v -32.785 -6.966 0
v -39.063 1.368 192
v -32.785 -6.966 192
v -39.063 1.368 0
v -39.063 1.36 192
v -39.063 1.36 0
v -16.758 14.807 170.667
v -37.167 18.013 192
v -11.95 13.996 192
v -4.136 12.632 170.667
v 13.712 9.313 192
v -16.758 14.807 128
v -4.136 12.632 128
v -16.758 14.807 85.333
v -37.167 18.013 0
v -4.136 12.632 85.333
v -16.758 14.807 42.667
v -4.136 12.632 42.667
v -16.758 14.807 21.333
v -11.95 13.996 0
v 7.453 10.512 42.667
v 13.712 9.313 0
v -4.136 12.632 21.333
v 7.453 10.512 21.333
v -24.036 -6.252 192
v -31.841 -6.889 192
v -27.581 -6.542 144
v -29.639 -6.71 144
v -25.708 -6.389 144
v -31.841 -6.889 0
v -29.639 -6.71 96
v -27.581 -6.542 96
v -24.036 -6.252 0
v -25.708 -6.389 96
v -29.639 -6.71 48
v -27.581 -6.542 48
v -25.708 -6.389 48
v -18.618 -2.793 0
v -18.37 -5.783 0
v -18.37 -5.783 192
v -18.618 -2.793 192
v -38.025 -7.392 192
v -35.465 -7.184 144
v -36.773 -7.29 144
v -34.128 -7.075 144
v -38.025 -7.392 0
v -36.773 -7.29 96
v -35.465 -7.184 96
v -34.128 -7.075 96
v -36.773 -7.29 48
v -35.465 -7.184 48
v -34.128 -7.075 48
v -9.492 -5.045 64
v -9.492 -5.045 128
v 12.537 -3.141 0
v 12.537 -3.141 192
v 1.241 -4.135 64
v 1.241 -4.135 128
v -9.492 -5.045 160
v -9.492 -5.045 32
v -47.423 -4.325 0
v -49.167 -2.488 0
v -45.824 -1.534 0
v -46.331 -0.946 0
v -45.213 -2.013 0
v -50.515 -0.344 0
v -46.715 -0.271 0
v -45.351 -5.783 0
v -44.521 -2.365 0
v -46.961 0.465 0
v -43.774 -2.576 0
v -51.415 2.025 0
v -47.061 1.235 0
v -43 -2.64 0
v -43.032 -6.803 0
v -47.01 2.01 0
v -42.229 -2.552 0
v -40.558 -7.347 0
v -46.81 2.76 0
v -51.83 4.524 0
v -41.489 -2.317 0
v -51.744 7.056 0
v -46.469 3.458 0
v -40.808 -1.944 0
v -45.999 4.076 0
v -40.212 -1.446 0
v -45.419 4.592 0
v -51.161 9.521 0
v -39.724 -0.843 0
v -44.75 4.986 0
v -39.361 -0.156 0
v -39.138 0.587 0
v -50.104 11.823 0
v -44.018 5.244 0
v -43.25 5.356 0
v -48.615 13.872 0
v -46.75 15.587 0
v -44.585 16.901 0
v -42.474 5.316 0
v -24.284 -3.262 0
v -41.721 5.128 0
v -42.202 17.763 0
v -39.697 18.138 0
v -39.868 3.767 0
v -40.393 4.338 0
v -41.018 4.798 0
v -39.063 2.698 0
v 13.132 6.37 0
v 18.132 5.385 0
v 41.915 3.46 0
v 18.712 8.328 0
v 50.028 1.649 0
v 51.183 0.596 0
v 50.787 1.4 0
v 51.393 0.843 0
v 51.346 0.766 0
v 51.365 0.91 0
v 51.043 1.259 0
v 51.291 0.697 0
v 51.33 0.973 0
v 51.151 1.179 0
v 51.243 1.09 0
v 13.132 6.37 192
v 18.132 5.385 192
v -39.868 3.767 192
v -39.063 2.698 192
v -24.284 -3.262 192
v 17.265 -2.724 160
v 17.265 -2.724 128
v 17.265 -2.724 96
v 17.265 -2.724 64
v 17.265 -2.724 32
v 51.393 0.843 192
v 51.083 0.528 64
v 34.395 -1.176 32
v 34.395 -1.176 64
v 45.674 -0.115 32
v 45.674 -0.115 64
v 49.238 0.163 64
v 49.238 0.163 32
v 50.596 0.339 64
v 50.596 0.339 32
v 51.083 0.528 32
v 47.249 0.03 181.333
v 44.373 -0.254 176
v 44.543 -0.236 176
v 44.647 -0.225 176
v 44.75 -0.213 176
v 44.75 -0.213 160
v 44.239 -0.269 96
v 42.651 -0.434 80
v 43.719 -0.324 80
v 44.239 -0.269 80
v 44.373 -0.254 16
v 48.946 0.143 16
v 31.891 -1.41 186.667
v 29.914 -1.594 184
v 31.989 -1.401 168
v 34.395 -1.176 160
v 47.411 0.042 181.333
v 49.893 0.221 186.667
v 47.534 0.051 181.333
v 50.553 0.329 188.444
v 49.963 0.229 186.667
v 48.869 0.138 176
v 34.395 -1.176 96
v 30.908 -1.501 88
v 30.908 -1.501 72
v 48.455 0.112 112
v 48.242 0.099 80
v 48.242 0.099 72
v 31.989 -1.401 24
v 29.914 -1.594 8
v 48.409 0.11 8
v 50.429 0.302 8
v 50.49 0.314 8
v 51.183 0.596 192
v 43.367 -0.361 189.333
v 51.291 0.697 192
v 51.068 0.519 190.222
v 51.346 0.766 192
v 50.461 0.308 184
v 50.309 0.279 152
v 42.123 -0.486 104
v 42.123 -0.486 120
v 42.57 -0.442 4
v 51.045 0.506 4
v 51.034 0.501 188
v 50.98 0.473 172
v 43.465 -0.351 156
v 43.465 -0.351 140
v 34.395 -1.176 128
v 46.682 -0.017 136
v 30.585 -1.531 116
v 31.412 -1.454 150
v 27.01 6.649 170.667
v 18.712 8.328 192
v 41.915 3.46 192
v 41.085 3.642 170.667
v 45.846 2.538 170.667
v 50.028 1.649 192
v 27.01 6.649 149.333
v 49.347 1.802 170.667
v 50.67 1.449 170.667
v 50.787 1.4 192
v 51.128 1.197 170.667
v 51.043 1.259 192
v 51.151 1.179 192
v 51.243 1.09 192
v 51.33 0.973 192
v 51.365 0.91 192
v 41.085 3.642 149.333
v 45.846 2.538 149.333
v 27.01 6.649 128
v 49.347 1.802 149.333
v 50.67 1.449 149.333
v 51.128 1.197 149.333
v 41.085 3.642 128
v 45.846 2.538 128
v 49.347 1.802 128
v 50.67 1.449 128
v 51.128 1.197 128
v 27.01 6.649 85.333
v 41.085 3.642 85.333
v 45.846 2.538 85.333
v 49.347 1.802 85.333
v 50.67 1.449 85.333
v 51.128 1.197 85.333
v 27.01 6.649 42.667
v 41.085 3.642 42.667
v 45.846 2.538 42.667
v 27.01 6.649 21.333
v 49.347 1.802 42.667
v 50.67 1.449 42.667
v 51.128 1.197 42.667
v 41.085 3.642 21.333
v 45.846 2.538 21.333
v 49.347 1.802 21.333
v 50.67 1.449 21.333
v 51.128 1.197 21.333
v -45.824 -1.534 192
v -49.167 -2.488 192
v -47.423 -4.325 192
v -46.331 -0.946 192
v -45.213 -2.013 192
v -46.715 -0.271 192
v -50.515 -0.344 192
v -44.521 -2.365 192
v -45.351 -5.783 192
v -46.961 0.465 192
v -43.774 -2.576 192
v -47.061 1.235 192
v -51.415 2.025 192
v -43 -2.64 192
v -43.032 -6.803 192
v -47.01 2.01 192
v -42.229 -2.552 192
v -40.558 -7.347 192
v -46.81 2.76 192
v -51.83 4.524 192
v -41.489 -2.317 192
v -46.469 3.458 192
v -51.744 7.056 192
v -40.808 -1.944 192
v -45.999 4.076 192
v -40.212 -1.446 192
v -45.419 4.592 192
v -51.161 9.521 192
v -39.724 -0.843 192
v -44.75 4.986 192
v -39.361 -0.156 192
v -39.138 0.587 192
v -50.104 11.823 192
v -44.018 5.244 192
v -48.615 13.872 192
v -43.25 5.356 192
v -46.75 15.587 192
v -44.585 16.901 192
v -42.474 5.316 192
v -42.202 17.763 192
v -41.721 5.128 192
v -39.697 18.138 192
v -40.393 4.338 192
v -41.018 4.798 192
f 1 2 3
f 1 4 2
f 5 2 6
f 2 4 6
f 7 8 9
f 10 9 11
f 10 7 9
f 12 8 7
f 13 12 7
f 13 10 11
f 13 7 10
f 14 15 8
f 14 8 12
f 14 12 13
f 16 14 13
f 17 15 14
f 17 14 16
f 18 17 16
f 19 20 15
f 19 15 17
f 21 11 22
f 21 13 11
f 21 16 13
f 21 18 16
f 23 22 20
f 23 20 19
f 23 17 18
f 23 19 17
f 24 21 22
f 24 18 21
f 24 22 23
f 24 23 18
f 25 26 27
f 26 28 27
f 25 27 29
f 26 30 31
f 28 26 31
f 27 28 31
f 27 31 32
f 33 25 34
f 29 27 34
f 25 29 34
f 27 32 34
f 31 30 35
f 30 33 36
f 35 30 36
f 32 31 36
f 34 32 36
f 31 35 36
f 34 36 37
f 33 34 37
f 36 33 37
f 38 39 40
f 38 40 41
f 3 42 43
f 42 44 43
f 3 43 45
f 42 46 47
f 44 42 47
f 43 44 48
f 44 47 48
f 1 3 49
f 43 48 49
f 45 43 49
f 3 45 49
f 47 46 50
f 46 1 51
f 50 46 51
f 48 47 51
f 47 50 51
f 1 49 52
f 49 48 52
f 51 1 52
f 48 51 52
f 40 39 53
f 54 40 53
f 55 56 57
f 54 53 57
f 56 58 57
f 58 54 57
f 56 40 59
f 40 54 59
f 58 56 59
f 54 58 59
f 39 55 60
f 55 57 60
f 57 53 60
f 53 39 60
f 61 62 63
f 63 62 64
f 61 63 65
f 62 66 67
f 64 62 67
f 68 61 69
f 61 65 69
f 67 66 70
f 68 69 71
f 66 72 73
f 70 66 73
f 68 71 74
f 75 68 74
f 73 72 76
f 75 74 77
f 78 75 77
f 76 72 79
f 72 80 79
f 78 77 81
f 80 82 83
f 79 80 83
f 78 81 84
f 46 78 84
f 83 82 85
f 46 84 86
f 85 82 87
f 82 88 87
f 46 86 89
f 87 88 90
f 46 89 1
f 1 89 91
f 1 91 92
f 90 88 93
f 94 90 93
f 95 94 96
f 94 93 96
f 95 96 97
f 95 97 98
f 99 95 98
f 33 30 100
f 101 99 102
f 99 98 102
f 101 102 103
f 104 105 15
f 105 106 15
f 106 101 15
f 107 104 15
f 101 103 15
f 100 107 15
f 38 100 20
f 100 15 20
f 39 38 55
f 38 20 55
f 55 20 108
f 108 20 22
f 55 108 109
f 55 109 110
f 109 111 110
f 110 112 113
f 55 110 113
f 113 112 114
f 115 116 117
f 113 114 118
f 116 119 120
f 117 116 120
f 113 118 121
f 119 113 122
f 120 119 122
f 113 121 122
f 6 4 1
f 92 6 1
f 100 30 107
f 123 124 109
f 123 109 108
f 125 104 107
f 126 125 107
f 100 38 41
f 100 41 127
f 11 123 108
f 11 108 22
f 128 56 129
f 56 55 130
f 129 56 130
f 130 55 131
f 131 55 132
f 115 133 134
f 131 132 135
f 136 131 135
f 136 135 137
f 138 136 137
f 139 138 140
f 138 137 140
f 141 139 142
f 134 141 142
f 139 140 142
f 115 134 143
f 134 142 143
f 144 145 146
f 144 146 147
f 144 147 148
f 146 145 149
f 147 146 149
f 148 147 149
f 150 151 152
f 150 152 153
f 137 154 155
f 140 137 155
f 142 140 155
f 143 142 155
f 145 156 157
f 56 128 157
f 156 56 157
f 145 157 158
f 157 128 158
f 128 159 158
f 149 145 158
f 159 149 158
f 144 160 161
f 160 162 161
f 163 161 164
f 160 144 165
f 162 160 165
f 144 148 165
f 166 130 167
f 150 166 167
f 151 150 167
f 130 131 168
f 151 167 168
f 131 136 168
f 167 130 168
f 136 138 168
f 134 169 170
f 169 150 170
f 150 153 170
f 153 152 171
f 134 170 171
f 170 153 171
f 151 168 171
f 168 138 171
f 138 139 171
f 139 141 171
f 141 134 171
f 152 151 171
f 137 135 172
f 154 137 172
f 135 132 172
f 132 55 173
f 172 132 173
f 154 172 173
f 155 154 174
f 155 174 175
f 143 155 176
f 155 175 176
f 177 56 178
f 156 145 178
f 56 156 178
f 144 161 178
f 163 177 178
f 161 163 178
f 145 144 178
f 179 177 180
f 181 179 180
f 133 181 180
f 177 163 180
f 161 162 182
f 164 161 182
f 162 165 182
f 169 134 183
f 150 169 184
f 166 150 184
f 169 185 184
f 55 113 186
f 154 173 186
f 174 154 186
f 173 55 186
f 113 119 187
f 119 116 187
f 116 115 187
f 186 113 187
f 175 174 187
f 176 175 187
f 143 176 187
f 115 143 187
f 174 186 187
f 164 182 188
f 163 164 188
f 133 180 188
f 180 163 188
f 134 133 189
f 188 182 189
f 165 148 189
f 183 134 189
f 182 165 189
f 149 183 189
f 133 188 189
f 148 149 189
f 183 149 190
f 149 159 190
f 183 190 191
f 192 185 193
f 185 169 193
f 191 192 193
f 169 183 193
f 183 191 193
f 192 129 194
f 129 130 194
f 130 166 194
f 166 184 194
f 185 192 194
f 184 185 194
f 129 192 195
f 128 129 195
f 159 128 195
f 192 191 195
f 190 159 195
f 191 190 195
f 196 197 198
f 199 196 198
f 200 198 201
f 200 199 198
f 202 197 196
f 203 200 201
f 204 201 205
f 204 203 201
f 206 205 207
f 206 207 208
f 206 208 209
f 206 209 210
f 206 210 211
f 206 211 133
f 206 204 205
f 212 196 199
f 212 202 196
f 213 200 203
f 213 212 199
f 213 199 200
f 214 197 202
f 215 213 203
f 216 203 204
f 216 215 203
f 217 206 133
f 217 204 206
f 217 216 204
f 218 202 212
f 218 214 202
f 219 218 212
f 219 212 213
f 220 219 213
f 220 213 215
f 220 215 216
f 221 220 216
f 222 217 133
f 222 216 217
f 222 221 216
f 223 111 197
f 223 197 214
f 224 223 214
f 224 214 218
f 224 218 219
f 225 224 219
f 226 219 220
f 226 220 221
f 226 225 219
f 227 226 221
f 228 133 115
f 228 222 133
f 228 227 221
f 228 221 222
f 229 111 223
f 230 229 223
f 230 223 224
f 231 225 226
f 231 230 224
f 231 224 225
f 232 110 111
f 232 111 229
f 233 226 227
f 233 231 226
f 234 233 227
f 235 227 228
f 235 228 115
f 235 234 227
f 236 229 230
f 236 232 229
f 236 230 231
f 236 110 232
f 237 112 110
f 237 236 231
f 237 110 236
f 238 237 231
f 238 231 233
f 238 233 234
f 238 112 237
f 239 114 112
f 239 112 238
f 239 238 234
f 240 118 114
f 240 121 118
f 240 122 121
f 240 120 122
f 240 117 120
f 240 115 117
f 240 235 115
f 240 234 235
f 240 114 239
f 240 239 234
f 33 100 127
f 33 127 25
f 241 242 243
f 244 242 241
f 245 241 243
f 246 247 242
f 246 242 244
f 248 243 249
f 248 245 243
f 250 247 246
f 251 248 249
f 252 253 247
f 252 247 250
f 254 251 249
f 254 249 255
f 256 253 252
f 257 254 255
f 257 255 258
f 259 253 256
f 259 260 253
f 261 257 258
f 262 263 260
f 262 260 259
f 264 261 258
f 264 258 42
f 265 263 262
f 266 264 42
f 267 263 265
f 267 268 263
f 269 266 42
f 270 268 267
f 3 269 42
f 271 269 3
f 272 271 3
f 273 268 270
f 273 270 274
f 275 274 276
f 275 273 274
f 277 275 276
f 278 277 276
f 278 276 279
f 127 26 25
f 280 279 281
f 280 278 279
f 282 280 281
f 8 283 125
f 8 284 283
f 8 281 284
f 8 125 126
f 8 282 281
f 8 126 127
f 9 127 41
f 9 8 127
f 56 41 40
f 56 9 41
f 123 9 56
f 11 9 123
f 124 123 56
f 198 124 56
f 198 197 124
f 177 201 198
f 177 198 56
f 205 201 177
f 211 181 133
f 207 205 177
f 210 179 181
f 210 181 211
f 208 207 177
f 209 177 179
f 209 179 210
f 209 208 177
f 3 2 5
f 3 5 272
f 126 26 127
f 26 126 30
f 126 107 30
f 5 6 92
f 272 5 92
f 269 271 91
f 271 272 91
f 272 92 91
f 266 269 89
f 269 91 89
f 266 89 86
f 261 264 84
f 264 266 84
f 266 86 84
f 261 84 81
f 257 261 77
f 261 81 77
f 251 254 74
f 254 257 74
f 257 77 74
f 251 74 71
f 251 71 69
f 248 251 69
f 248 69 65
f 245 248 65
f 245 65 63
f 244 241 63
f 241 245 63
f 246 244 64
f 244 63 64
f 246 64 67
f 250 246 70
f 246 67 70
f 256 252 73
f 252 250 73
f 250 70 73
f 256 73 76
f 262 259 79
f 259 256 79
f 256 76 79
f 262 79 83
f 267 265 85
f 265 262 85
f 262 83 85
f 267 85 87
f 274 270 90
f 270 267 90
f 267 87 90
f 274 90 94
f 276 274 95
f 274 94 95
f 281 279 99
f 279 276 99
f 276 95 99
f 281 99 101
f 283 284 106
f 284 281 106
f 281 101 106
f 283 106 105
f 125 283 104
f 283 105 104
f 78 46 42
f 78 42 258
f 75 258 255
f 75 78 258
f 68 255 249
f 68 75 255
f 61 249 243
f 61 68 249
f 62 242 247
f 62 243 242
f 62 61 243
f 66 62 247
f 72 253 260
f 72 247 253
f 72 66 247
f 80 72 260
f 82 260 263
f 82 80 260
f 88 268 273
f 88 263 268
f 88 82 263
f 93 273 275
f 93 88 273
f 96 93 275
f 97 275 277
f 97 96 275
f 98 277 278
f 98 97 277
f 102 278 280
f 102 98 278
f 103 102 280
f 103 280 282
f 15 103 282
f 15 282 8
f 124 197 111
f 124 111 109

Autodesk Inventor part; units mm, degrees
ref_plane "YZ Plane" through (0, 0, 0) normal (1, 0, 0) x (0, 1, 0)
ref_plane "XZ Plane" through (0, 0, 0) normal (0, 1, 0) x (-1, 0, 0)
ref_plane "XY Plane" through (0, 0, 0) normal (0, 0, 1) x (1, 0, 0)
sketch "Sketch2" plane through (0, 0, 0) normal (0, 0, 1) x (1, 0, 0)
  line L0 (18.7124, 8.328) -> (18.1325, 5.3846)
  line L1 (13.7124, 9.3131) -> (18.7124, 8.328)
  line L2 (13.1325, 6.3697) -> (13.7124, 9.3131)
  line L3 (18.1325, 5.3846) -> (13.1325, 6.3697)
  spline S0 degree 4 poles (-37.1669, 18.0129) (-32.0265, 17.2427) (-23.4508, 15.9354) (-12.1298, 14.0656) (1.57, 11.6269) (12.5569, 9.5628) (22.3152, 7.6138) (30.7628, 5.8944) (37.7432, 4.3297) (44.5535, 2.9574) (48.5705, 1.7508) (51.0887, 1.6849) (51.3931, 0.8429) knots 0 0 0 0 0 0.183688 0.302378 0.416104 0.523956 0.624947 0.717922 0.80148 0.873691 1 1 1 1 1
  spline S1 degree 2 poles (-25.5966, 10.0026) (-25.4878, 9.9865) (-25.3792, 9.9704) knots 0 0 0 1 1 1
  line L4 (-25.4014, 9.9736) -> (-25.357, 9.9671) construction
  arc A0 (-25.3615, 9.9677) -> (-25.3969, 9.973) centre (-40.9588, -94.8535) ccw construction
  line L5 (-24.2835, -3.2624) -> (-24.0359, -6.2521)
  line L6 (-24.0359, -6.2521) -> (-18.3701, -5.783)
  line L7 (-18.6176, -2.7932) -> (-24.2835, -3.2624)
  line L8 (-39.0627, 5.3599) -> (-39.0627, 1.3599)
  line L9 (-39.0627, 1.3599) -> (-43.0627, 1.3599)
  arc A1 (-39.8677, 3.7666) -> (-39.0627, 1.3682) centre (-43.0627, 1.3599) ccw
  arc A2 (-37.1669, 18.0129) -> (-38.0249, -7.3921) centre (-39.0627, 5.3599) ccw
  line L10 (-18.3701, -5.783) -> (-18.6176, -2.7932)
  spline S2 degree 4 poles (9.4193, -3.4138) (11.4228, -3.2393) (15.865, -2.8497) (22.3591, -2.2688) (30.3236, -1.5742) (37.4254, -0.8702) (44.3418, -0.3579) (48.4757, 0.3135) (50.9779, 0.0538) (51.3931, 0.8429) knots 0.442408 0.442408 0.442408 0.442408 0.442408 0.523404 0.624432 0.717481 0.801136 0.873452 1 1 1 1 1
  line L11 (4.7469, -3.8205) -> (14.0918, -3.007) construction
  arc A3 (5.6813, -3.7375) -> (13.1571, -3.0867) centre (-353.4721, 4165.1771) ccw construction
  line L12 (-18.3701, -5.783) -> (-10.8502, -5.1603) construction
  line L13 (-10.8502, -5.1603) -> (1.3894, -4.1468) construction
  line L14 (1.3894, -4.1468) -> (12.5371, -3.1411) construction
  spline S3 degree 3 poles (-18.3701, -5.783) (-10.8502, -5.1603) (1.3894, -4.1468) (12.5371, -3.1411) knots 1 1 1 1 2 2 2 2
  line L15 (-39.8677, 3.7666) -> (-31.8412, -6.8892)
  line L16 (-39.0627, 1.3682) -> (-32.7849, -6.9659)
  spline S4 degree 4 poles (-38.0249, -7.3921) (-36.8101, -7.2933) (-35.4821, -7.1853) (-34.1239, -7.0749) (-32.7849, -6.9659) knots 0 0 0 0 0 1 1 1 1 1
  spline S5 degree 4 poles (-31.8412, -6.8892) (-27.1613, -6.5084) (-22.9298, -6.1633) (-21.0796, -6.0088) (-18.3701, -5.783) knots 0.24985 0.24985 0.24985 0.24985 0.24985 1 1 1 1 1
  line L17 (-33.3312, -7.0104) -> (-32.2386, -6.9215) construction
  arc A4 (-33.2219, -7.0015) -> (-32.3479, -6.9304) centre (-843.5448, 9960.1133) ccw construction
  line L18 (-33.4282, -7.0183) -> (-30.2541, -6.76) construction
  arc A5 (-33.1108, -6.9924) -> (-30.5716, -6.7858) centre (-842.8237, 9960.172) ccw construction
  point P0 (0, 0)
  point P1 (0.9282, 3.5218)
  point P2 (-2.5419, 1.8477)
  point P3 (-23.1779, 15.8549)
  point P4 (-10.0259, 13.6649)
  point P5 (2.1391, 11.4989)
  point P6 (13.1941, 9.4139)
  point P7 (23.0191, 7.4639)
  point P8 (31.5091, 5.7029)
  point P9 (38.5801, 4.1789)
  point P10 (44.1541, 2.9429)
  point P11 (48.1801, 2.0309)
  point P12 (50.6101, 1.4729)
  point P13 (-10.8502, -5.1603)
  point P14 (1.3894, -4.1468)
  point P15 (31.0831, -1.4851)
  point P16 (38.2711, -0.8281)
  point P17 (43.9471, -0.3001)
  point P18 (48.0511, 0.0869)
  point P19 (50.5321, 0.3239)
  point P20 (-51.8495, 5.7955)
  point P21 (51.3931, 1.2839)
  point P22 (-51.8489, 20.0789)
  point P23 (-52.6589, -8.5531)
  point P24 (51.3931, 0.4019)
  point P25 (-37.1669, 5.3448)
  point P26 (-23.1779, 4.8372)
  point P27 (-10.0259, 4.2921)
  point P28 (2.1391, 3.7285)
  point P29 (13.1941, 3.1654)
  point P30 (23.0191, 2.6255)
  point P31 (31.5091, 2.1283)
  point P32 (38.5801, 1.6897)
  point P33 (44.1541, 1.3311)
  point P34 (48.1801, 1.065)
  point P35 (50.6101, 0.9019)
  point P36 (-25.9398, -0.159)
  point P37 (9.8274, 3.135)
  point P38 (-20.001, 9.1398)
  point P39 (-14.7402, 8.2638)
  point P40 (-9.8742, 7.3974)
  point P41 (-5.4522, 6.5634)
  point P42 (-1.5222, 5.7834)
  point P43 (1.8738, 5.079)
  point P44 (4.7022, 4.4694)
  point P45 (6.9318, 3.975)
  point P46 (8.5422, 3.6102)
  point P47 (9.5142, 3.387)
  point P48 (-20.3442, 0.297)
  point P49 (-15.0702, 0.7374)
  point P50 (-10.1754, 1.155)
  point P51 (-5.715, 1.5414)
  point P52 (-1.7406, 1.893)
  point P53 (1.7034, 2.2038)
  point P54 (4.5786, 2.4666)
  point P55 (6.849, 2.6778)
  point P56 (8.4906, 2.8326)
  point P57 (9.483, 2.9274)
  point P58 (9.4193, -3.4138)
  point P59 (-39.0627, 1.3682)
  point P60 (-39.0627, 1.3599)
  dimension "d14" = 3
  dimension "d15" = 5
  dimension "d16" = 52.7751
  dimension "d17" = 3
  dimension "d18" = 5.6658
  dimension "d19" = 4
  dimension "d20" = 4
  dimension "d21" = 8
  dimension "d23" = 0.8
extrude "Extrusion3" add sketch "Sketch2" along normal blind 192 contours S0 S2 S3 L10 L7 L5 S5 L15 A1 L8 L16 S4 A2 L2 L3 L0
properties part number "2P.03.01.01.IM.FlapBody"
